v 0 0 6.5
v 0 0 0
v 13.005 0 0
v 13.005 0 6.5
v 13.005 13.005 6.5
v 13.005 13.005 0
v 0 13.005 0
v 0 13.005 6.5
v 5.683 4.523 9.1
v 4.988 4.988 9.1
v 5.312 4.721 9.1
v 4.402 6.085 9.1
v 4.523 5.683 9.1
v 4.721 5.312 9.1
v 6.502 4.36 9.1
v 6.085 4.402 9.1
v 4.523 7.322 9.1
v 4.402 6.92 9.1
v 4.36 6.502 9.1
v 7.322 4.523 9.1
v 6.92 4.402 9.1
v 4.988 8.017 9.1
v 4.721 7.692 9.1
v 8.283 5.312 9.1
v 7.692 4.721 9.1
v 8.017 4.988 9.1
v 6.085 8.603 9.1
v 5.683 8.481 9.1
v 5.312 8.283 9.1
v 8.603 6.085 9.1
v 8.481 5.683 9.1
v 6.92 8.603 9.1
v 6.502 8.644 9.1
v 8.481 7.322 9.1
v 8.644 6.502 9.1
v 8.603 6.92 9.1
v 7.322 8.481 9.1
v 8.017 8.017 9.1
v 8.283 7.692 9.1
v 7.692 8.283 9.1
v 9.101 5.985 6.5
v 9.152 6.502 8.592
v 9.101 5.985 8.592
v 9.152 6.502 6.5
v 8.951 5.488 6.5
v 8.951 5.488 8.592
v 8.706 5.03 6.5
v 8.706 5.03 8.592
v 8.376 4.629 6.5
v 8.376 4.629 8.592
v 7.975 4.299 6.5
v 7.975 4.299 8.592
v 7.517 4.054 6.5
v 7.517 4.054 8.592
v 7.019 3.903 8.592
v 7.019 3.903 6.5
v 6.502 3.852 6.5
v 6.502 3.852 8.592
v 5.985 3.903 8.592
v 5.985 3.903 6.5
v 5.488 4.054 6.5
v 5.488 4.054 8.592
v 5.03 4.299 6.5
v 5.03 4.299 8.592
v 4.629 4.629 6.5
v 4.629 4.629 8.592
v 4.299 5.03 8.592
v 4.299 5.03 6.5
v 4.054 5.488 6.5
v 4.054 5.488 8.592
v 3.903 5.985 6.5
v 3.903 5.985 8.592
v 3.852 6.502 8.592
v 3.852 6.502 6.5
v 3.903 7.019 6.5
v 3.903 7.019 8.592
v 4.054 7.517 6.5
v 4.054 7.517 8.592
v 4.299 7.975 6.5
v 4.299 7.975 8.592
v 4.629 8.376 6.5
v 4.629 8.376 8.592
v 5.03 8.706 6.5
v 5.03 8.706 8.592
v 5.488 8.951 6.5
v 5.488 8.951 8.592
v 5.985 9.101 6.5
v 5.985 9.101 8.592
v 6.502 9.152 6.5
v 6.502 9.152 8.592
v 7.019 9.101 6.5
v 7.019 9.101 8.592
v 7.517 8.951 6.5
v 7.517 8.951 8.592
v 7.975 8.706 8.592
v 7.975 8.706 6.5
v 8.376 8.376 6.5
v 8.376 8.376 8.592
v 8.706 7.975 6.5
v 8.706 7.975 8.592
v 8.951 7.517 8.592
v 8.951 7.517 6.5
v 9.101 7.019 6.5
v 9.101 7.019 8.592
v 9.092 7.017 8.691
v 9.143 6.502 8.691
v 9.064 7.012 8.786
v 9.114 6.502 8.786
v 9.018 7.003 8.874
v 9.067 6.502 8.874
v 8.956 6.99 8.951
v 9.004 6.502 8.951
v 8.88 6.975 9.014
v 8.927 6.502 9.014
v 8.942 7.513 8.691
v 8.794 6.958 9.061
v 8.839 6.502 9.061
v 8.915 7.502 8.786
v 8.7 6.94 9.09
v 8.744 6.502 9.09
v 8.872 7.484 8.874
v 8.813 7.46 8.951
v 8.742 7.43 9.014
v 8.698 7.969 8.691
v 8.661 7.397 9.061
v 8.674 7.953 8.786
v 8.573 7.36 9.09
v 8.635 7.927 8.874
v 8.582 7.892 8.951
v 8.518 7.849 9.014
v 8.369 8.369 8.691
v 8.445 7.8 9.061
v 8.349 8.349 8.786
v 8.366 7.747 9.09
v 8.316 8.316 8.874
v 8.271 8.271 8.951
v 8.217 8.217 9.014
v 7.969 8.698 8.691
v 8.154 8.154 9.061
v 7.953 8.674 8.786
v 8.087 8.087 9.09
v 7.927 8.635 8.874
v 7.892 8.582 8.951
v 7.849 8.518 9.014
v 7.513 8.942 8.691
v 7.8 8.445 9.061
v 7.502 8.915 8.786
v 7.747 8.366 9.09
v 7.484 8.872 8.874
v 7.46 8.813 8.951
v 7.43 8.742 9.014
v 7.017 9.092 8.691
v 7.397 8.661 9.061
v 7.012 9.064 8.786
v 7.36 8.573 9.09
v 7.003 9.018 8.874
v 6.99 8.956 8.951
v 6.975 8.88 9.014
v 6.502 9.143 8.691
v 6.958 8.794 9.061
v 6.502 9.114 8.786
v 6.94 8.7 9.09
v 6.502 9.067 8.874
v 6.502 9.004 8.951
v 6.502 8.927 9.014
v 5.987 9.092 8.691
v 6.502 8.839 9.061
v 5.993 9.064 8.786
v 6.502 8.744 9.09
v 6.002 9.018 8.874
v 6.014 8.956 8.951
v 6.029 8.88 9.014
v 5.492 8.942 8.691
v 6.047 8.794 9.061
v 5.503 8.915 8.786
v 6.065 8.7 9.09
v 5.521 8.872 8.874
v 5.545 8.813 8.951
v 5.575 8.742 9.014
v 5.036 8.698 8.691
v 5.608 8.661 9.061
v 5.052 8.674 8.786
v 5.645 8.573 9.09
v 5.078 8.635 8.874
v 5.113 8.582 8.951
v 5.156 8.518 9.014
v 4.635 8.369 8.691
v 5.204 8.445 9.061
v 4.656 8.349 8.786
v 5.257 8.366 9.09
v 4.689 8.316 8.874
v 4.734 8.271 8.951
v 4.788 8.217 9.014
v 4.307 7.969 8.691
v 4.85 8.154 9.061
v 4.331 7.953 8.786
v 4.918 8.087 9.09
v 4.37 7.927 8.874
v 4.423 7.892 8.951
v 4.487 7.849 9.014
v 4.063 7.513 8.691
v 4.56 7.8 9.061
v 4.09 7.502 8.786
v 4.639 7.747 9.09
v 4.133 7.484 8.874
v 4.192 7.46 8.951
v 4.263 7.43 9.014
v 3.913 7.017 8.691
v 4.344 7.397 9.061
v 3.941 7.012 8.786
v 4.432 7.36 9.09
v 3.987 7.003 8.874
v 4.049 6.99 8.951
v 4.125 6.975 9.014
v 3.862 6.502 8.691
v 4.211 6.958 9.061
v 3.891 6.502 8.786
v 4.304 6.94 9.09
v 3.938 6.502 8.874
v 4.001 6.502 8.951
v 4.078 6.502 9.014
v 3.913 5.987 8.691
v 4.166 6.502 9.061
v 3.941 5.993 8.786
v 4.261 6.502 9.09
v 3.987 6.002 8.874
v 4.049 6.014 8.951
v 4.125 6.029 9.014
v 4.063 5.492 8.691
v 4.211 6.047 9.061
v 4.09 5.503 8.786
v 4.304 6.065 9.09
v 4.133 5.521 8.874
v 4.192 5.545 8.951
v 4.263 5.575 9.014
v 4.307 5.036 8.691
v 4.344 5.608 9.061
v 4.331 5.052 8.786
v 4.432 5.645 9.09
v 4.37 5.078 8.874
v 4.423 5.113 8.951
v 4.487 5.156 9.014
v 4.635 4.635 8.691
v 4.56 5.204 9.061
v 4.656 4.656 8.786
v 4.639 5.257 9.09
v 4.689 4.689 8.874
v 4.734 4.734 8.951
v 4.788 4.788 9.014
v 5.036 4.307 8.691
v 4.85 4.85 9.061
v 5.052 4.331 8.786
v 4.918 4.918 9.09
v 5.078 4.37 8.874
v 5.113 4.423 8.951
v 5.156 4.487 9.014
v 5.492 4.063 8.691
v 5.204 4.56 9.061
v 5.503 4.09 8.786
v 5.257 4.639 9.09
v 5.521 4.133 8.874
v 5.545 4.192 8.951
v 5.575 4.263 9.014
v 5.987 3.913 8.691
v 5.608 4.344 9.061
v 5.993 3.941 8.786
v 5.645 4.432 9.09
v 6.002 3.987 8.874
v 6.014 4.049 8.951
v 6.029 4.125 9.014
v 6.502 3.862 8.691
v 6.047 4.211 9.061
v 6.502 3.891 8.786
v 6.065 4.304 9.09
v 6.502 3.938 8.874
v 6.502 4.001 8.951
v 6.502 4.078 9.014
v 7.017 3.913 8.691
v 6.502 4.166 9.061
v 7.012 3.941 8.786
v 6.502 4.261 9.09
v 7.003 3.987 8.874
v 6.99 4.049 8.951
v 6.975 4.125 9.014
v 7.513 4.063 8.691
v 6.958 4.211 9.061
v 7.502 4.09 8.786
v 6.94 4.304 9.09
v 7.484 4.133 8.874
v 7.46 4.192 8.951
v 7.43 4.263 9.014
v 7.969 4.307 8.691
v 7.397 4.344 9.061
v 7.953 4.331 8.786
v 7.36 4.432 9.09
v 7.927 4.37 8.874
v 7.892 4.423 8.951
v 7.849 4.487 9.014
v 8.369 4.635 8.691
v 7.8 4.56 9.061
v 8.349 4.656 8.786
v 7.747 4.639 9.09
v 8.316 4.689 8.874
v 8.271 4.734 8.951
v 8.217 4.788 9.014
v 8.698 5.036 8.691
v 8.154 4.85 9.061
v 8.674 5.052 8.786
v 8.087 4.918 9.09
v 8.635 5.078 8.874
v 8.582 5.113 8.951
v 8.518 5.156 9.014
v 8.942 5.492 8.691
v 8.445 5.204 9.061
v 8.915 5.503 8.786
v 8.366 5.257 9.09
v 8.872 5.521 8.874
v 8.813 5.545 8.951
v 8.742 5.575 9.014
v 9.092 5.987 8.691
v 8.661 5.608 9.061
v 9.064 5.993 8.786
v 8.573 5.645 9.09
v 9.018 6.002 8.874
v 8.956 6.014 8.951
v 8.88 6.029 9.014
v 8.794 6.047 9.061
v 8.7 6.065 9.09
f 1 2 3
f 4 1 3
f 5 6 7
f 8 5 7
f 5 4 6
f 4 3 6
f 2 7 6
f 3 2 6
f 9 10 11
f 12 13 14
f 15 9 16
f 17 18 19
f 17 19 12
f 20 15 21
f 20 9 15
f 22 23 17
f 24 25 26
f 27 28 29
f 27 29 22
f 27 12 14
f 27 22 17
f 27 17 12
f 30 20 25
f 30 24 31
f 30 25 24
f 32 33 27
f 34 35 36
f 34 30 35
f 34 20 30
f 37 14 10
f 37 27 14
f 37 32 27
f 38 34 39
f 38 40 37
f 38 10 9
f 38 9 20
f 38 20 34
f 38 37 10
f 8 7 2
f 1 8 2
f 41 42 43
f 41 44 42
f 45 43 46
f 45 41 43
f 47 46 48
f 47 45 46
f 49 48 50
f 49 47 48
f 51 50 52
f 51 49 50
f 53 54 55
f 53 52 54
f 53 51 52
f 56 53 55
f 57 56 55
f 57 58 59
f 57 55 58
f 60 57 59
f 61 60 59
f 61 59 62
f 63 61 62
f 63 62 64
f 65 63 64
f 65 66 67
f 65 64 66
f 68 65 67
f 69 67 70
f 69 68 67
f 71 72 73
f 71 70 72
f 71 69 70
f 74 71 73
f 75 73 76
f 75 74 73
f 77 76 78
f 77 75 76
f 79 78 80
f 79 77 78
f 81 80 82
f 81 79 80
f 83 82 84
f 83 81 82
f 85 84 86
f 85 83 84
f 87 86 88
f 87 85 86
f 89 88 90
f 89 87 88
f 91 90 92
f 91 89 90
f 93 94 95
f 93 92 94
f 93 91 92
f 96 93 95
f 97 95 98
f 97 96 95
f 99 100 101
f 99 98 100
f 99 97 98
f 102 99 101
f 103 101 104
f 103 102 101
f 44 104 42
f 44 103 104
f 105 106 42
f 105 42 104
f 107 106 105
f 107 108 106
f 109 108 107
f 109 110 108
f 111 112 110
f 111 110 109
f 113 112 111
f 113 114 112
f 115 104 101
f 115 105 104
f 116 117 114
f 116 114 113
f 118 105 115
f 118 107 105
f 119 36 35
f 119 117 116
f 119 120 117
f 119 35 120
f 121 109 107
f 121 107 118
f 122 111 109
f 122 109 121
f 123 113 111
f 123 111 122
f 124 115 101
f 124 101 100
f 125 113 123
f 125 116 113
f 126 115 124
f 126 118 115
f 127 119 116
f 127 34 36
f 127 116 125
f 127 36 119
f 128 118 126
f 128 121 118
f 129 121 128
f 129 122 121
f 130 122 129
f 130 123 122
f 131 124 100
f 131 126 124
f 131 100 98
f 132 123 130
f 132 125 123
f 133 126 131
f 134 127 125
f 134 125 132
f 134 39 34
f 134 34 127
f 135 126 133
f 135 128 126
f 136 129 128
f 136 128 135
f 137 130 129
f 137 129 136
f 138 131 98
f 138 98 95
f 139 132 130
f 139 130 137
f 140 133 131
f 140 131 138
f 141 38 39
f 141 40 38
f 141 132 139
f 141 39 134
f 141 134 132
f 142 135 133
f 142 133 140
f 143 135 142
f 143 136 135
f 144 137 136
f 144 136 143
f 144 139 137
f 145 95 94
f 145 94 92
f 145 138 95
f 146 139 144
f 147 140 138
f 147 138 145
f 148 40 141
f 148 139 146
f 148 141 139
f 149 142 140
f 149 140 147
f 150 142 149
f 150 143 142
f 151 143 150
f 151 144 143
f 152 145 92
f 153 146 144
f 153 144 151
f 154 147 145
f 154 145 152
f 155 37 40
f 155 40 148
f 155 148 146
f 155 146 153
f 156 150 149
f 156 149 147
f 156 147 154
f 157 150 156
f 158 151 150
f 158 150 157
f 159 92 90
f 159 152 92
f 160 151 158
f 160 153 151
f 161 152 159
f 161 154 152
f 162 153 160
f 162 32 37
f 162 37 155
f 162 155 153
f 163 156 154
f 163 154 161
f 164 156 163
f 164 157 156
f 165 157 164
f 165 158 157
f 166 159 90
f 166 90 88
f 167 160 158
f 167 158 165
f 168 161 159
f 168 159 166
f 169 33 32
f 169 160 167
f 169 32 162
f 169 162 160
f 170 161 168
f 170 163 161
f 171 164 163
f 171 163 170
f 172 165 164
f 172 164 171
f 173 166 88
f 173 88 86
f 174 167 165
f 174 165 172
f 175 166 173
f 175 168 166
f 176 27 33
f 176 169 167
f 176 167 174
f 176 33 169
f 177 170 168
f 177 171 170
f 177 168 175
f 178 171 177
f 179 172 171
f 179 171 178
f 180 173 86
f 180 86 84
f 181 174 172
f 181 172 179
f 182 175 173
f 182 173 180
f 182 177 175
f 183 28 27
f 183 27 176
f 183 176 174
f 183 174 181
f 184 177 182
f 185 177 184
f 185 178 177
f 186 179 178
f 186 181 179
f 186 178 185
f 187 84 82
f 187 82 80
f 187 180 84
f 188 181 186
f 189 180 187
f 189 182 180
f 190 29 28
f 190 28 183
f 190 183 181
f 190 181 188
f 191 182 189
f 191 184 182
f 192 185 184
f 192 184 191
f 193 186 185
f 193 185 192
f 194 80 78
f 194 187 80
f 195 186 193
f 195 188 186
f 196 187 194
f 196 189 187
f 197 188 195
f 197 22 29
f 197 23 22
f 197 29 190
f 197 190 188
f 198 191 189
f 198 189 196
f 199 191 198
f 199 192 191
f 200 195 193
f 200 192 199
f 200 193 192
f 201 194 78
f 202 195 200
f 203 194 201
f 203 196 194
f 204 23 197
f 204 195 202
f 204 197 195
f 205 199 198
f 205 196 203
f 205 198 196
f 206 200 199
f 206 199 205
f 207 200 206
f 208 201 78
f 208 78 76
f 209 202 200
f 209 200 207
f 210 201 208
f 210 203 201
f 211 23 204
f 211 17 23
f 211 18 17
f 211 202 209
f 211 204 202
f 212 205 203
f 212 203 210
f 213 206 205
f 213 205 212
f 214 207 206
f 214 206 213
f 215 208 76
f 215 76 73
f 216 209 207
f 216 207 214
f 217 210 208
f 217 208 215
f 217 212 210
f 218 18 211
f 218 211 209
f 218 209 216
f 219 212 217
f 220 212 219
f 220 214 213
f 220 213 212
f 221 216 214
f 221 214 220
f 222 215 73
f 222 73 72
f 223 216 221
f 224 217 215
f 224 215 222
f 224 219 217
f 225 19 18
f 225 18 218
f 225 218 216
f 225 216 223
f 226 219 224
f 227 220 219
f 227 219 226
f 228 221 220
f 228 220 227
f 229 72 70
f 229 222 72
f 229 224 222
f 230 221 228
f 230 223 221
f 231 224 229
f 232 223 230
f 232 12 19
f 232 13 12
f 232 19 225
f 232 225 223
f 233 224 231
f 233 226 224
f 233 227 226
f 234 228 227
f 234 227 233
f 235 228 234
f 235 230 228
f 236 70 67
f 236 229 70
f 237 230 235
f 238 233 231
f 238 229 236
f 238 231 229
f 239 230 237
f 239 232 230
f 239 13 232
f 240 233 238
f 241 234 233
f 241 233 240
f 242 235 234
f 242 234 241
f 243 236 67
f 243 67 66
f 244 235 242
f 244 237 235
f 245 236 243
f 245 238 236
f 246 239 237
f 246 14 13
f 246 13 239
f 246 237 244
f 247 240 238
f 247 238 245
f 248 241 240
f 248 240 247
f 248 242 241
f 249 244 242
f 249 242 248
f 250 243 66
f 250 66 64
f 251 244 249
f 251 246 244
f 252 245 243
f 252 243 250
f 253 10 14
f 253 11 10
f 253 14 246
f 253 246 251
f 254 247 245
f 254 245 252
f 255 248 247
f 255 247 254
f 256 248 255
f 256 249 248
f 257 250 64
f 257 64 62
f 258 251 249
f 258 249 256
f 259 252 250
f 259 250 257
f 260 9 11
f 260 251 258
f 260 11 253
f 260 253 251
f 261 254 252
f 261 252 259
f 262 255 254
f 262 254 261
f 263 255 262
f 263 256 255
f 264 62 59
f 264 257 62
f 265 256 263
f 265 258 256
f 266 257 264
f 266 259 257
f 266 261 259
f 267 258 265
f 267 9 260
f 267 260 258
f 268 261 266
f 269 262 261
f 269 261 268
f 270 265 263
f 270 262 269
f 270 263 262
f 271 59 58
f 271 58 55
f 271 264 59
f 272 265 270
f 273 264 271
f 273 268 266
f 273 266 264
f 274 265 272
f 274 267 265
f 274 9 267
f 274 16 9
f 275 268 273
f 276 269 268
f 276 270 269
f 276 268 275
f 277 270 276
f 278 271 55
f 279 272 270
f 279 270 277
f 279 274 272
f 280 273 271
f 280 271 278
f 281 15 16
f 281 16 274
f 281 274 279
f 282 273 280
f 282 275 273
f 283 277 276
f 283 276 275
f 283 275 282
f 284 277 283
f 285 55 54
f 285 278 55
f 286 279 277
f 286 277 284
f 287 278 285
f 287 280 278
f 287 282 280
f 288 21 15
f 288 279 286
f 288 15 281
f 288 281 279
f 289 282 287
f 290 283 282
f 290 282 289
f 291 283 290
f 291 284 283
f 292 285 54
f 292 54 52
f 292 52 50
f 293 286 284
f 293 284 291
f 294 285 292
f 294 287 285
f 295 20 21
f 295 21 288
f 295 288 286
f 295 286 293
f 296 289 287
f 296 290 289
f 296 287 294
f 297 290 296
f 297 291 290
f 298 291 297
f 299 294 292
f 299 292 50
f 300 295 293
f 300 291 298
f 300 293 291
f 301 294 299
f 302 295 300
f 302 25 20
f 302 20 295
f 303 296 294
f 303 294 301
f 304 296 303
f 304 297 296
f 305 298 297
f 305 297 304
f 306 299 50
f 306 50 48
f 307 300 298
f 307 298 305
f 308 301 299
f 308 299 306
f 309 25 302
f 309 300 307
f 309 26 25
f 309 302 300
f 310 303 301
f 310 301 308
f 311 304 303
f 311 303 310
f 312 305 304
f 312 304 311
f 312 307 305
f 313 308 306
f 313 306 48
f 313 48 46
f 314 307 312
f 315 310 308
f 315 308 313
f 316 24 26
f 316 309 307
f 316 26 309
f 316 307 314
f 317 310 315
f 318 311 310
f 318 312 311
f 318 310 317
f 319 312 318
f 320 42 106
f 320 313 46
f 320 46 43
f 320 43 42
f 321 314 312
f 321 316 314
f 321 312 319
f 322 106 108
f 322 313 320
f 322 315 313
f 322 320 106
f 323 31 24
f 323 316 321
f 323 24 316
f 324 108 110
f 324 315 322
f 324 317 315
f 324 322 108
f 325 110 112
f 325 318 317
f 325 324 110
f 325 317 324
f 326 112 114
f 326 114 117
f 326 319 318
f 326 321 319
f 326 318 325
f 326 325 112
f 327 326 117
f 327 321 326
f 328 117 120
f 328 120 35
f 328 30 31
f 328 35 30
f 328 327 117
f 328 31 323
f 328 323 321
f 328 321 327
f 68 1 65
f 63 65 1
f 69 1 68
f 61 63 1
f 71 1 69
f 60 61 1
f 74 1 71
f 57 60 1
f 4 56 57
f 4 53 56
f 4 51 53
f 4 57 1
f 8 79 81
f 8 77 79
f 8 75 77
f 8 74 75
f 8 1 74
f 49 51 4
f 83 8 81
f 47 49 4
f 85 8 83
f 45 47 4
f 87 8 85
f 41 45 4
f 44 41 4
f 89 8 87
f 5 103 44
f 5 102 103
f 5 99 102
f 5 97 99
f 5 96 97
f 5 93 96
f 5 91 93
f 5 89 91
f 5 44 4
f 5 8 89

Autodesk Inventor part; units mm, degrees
ref_plane "YZ Plane" through (0, 0, 0) normal (1, 0, 0) x (0, 1, 0)
ref_plane "XZ Plane" through (0, 0, 0) normal (0, 1, 0) x (-1, 0, 0)
ref_plane "XY Plane" through (0, 0, 0) normal (0, 0, 1) x (1, 0, 0)
sketch "Sketch1" plane through (0, 0, 0) normal (0, 0, 1) x (1, 0, 0)
  line L0 (0, 0) -> (13.0048, 0)
  line L1 (13.0048, 0) -> (13.0048, 13.0048)
  line L2 (13.0048, 13.0048) -> (0, 13.0048)
  line L3 (0, 13.0048) -> (0, 0)
  dimension "d0" = 13.0048
  dimension "d1" = 13.0048
extrude "Extrusion1" add sketch "Sketch1" along normal blind 6.5
sketch "Sketch2" plane through (0, 0, 6.5) normal (0, 0, 1) x (1, 0, 0)
  circle A0 centre (6.5024, 6.5024) radius 2.65
  line L0 (13.0048, 0) -> (13.0048, 13.0048) projected
  line L1 (13.0048, 13.0048) -> (0, 13.0048) projected
  point P0 (0, 0)
  point P1 (13.0048, 6.5024)
  point P2 (6.5024, 13.0048)
  dimension "d4" = 5.3
extrude "Extrusion2" add sketch "Sketch2" along normal blind 2.6
fillet "Fillet1" radius 0.508 1 edges at (3.8524, 6.5024, 9.1)
properties part number "Power switch"
